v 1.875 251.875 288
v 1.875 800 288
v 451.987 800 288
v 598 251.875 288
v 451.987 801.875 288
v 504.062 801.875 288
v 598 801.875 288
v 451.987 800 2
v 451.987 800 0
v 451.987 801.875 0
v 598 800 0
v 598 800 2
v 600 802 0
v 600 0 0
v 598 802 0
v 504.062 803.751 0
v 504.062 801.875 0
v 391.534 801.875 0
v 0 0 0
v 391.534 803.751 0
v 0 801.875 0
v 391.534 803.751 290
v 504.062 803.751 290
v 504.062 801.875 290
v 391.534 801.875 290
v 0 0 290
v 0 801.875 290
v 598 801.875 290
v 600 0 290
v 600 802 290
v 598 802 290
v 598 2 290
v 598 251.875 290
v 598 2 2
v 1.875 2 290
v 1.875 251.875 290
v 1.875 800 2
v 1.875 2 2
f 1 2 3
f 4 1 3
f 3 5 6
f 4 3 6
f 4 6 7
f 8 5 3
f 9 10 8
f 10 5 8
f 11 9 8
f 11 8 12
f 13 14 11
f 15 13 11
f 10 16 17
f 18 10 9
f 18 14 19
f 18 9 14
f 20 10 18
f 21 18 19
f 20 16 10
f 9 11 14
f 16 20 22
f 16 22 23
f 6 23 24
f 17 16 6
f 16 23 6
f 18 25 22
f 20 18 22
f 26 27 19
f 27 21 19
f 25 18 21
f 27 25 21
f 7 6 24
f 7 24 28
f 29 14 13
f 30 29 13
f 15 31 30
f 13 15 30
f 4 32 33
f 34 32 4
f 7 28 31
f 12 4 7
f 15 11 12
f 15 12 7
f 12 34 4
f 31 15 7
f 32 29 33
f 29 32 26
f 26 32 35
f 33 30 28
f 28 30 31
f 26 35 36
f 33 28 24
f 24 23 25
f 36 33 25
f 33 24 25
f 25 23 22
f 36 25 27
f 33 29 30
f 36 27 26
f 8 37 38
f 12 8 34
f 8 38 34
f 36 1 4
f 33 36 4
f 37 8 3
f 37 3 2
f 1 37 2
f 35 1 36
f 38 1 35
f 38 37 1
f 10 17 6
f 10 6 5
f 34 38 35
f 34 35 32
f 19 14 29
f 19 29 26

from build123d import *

# Parameters (mm, degrees)
EXTRUDE_1_DEPTH = 290
SKETCH_2_W      = 598
SKETCH_2_H      = 2
EXTRUDE_2_DEPTH = 800
EXTRUDE_START   = 801.875465
SKETCH_3_W      = 600
SKETCH_3_H      = 2
EXTRUDE_3_DEPTH = 550


with BuildPart() as part:
    # 草图1 → 凸台-拉伸1 (new body)
    with BuildSketch(Plane.XY):
        Polygon((0, 801.875465042), (1.875465042, 801.875465042), (391.533669143, 801.875465042), (391.533669143, 803.750930084), (504.06157166, 803.750930084), (504.06157166, 801.875465042), (451.987075109, 801.875465042), (451.987075109, 800), (1.875465042, 800), (1.875465042, 2), (598, 2), (598, 802), (600, 802), (600, 1.871806921), (600, 0), (0, 0), (0, 1.875465042), align=None)
    extrude(amount=EXTRUDE_1_DEPTH)

    # 草图2 → 凸台-拉伸2 (add)
    with BuildSketch(Plane(origin=(0, 0, 0), x_dir=(1, 0, 0), z_dir=(0, 1, 0))):
        with Locations((299, -1)):
            Rectangle(SKETCH_2_W, SKETCH_2_H)
    extrude(amount=EXTRUDE_2_DEPTH)

    # 草图3 → 凸台-拉伸3 (add)
    with BuildSketch(Plane(origin=(0, 0, 0), x_dir=(1, 0, 0), z_dir=(0, 1, 0)).offset(EXTRUDE_START)):
        with Locations((300, -289)):
            Rectangle(SKETCH_3_W, SKETCH_3_H)
    extrude(amount=-EXTRUDE_3_DEPTH)


solid = part.part
